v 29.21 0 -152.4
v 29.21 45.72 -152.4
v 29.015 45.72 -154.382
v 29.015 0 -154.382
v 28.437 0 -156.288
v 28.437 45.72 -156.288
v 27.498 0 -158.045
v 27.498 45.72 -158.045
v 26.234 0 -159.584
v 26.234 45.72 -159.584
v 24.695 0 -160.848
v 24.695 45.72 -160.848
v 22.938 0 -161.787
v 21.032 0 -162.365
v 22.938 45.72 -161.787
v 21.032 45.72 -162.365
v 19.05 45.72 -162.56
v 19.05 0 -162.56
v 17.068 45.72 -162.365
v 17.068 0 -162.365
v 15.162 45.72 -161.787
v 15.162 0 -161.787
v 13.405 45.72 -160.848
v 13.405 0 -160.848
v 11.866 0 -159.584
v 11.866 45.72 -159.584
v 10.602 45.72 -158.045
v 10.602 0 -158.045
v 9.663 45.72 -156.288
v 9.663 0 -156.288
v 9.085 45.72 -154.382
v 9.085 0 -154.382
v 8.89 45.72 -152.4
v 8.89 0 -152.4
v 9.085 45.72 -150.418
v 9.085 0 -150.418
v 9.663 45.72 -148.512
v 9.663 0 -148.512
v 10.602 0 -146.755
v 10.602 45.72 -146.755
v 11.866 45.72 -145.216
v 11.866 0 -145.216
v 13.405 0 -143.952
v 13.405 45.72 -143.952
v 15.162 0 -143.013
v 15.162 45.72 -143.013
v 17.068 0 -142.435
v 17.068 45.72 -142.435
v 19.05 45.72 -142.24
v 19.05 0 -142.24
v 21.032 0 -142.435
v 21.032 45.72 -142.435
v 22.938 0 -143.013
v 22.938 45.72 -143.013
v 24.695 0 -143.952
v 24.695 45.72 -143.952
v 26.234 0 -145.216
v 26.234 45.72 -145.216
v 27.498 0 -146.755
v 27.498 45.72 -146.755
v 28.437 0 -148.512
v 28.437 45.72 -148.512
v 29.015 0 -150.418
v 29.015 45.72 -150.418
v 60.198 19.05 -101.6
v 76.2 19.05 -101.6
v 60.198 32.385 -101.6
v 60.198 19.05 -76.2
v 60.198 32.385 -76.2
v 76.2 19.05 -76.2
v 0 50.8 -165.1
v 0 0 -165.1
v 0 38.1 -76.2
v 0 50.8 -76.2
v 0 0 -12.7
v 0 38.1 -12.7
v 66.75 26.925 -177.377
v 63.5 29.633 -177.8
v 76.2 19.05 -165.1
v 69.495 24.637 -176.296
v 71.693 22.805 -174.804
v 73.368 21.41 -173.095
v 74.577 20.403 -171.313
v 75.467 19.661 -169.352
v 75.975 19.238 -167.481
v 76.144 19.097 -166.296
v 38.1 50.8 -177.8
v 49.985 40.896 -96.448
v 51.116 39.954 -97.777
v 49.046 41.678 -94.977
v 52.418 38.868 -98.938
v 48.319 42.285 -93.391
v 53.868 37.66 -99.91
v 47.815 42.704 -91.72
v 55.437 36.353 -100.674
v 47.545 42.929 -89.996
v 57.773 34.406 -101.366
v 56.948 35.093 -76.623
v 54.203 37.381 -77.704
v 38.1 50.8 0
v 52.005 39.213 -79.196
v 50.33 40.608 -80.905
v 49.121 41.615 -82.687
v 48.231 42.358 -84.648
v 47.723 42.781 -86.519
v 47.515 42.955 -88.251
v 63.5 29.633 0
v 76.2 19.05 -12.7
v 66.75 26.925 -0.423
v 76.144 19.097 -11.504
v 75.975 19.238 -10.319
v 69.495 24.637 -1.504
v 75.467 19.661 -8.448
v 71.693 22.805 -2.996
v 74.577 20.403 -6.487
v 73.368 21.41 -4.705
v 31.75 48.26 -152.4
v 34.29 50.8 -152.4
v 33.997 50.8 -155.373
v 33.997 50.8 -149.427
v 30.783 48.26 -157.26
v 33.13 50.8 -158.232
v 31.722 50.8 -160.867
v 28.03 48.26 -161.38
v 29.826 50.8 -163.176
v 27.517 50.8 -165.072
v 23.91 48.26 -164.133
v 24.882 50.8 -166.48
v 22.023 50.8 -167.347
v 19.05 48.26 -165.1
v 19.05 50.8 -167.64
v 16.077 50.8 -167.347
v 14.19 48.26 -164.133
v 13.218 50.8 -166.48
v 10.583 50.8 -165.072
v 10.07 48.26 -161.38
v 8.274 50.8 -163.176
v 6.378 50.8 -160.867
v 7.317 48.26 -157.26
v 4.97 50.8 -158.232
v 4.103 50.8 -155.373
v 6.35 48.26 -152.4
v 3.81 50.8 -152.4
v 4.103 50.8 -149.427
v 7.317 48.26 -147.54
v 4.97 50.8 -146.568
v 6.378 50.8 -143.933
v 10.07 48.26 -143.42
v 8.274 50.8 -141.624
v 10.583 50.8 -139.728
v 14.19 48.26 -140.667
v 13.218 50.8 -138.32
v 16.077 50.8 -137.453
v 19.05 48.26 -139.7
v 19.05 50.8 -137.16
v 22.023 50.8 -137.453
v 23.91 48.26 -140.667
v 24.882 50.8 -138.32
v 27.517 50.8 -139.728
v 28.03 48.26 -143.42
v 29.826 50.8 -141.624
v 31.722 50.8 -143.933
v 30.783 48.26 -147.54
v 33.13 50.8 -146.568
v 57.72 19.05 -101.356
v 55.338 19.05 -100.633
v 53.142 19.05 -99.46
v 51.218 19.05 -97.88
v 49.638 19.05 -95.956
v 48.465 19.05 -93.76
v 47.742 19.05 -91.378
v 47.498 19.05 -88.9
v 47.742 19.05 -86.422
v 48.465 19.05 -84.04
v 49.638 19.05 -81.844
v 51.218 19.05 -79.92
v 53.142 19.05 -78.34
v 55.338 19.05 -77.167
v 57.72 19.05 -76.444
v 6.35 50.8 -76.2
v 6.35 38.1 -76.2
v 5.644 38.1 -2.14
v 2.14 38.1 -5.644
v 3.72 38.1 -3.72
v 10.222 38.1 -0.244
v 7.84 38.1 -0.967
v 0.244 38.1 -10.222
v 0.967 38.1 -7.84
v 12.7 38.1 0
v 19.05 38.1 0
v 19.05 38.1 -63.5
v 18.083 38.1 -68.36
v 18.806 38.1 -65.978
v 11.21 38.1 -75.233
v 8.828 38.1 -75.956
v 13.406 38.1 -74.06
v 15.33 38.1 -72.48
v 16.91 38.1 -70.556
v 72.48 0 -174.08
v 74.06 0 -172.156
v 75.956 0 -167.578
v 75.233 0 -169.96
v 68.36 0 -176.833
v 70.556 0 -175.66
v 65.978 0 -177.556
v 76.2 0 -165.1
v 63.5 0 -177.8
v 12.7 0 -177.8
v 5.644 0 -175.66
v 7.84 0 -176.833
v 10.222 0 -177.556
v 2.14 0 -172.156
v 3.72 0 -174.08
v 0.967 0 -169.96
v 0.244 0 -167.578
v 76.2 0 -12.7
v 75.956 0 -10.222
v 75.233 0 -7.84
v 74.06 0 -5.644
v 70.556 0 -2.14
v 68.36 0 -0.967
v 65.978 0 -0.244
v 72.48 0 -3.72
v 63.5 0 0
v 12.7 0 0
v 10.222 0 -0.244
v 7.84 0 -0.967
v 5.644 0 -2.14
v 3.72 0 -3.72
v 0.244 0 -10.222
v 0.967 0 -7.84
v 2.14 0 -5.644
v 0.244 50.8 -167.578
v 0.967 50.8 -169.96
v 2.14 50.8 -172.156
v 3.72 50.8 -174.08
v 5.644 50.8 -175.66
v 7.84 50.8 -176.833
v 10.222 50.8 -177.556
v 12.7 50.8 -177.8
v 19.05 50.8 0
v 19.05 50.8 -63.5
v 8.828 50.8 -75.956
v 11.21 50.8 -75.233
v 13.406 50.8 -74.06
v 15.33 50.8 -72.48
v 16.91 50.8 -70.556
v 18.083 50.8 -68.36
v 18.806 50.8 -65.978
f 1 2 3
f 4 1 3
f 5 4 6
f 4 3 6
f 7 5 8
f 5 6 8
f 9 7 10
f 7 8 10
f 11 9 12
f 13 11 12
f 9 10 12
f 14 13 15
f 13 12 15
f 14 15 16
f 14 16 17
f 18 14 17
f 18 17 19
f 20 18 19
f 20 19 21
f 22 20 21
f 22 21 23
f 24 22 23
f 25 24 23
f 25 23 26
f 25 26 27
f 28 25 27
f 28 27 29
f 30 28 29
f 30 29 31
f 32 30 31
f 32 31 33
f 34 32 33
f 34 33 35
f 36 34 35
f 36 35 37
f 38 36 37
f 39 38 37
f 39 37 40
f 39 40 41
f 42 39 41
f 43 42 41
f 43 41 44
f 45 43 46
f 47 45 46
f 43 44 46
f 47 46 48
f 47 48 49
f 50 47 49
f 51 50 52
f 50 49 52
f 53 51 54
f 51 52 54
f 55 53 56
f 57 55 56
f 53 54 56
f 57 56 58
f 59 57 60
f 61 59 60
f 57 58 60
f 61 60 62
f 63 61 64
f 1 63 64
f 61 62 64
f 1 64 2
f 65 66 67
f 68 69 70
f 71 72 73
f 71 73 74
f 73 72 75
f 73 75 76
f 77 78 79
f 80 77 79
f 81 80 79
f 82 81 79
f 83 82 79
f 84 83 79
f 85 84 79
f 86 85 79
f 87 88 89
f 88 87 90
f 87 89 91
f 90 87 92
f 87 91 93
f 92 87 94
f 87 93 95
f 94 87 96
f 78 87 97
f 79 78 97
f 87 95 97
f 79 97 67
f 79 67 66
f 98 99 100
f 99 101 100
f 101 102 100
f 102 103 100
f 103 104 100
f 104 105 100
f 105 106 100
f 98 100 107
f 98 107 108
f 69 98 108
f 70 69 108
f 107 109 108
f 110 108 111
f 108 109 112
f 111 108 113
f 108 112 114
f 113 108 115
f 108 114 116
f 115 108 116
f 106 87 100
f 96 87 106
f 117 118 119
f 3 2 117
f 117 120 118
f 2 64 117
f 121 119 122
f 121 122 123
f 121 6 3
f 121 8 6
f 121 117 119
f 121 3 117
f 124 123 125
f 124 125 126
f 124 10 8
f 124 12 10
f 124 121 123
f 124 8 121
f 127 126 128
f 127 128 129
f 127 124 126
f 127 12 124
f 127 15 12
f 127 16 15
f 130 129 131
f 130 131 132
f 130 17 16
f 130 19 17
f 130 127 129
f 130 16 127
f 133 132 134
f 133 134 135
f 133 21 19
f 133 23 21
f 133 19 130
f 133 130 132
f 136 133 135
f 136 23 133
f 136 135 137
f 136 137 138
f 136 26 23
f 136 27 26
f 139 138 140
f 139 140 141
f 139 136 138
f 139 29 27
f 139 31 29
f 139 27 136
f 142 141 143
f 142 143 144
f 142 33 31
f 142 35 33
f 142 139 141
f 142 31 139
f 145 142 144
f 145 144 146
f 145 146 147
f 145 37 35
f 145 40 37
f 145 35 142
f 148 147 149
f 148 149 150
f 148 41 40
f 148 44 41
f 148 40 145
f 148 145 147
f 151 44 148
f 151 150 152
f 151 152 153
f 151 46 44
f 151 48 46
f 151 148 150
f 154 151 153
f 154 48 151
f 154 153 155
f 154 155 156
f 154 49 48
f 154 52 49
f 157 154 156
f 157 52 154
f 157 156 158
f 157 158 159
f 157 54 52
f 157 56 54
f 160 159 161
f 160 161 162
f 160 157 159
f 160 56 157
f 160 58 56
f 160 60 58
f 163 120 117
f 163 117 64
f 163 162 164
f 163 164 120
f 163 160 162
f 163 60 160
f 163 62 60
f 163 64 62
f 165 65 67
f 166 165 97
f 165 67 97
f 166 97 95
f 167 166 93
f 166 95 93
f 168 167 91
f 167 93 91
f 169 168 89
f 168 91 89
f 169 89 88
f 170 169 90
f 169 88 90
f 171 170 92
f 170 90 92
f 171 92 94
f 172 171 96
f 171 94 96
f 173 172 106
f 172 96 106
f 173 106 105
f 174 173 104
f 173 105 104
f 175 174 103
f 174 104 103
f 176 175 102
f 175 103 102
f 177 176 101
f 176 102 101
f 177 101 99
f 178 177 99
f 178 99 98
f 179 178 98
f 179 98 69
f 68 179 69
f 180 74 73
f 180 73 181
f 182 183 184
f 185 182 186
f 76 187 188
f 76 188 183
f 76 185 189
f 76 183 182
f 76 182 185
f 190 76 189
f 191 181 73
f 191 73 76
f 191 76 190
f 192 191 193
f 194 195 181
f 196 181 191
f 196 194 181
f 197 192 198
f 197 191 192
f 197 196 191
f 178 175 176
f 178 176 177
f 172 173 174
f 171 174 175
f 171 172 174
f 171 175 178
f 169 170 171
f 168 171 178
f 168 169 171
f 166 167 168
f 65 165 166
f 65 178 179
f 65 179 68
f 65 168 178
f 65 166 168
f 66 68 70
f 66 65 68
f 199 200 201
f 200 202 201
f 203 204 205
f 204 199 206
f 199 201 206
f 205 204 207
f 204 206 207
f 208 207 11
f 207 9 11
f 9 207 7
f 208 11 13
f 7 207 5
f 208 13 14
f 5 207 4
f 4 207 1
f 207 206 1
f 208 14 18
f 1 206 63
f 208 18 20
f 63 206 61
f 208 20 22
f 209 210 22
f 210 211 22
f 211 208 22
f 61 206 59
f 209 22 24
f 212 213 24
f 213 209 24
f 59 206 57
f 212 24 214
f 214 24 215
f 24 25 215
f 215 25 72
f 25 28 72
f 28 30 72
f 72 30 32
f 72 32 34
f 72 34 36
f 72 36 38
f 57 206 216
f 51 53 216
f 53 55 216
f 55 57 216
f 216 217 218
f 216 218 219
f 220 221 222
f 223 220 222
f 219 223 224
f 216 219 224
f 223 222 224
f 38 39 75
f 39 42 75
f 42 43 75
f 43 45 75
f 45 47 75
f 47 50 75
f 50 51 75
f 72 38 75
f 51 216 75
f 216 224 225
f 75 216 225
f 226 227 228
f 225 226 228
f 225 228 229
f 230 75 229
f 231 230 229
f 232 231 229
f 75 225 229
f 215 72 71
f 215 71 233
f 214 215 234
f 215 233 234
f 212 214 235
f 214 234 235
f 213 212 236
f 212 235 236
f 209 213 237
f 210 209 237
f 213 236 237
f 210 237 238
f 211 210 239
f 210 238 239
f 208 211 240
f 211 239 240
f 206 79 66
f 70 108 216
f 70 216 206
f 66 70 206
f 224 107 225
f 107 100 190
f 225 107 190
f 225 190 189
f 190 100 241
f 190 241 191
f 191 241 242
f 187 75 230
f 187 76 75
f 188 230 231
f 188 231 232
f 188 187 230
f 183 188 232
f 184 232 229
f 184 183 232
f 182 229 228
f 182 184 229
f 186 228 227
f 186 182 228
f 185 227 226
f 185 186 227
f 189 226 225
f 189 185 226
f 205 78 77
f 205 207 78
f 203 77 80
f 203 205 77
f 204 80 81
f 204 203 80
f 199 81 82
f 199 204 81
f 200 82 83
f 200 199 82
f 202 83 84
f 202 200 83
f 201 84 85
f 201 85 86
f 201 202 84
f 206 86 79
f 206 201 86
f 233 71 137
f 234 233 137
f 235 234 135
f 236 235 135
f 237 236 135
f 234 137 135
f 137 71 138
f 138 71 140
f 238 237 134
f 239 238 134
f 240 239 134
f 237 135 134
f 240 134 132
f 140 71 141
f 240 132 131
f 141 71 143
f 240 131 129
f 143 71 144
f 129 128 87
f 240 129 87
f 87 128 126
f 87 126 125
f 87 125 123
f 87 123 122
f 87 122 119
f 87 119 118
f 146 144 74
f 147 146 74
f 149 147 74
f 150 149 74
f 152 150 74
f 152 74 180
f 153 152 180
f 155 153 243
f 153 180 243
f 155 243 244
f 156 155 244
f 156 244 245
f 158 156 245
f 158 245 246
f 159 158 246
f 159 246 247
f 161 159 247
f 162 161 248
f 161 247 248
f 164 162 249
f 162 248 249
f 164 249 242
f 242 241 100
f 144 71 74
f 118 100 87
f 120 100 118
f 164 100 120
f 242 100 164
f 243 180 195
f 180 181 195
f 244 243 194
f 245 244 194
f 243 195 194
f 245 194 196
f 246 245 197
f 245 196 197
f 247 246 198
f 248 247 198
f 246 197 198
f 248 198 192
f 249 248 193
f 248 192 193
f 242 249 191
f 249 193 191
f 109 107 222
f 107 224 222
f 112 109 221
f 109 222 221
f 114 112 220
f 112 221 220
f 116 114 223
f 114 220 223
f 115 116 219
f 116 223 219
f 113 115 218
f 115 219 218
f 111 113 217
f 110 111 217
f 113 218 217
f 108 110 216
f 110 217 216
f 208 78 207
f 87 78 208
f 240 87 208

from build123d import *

# Parameters (mm, degrees)
BOSS_EXTRUDE1_DEPTH = 177.8
SKETCH8_R           = 10.16
CUT_EXTRUDE1_DEPTH  = 51.8
CHAMFER1_SIZE       = 5.08
SKETCH9_W           = 19.05
SKETCH9_H           = 76.2
CUT_EXTRUDE2_DEPTH  = 12.7
FILLET1_R           = 12.7
CUT_EXTRUDE3_DEPTH  = 31.75
FILLET2_R           = 12.7


with BuildPart() as part:
    # Sketch1 → Boss-Extrude1 (new body)
    with BuildSketch(Plane.XY):
        Polygon((0, 0), (0, 50.8), (38.1, 50.8), (76.2, 19.05), (76.2, 0), align=None)
    extrude(amount=-BOSS_EXTRUDE1_DEPTH)

    # Sketch8 → Cut-Extrude1 (cut, through all)
    with BuildSketch(Plane(origin=(0, 50.8, 0), x_dir=(1, 0, 0), z_dir=(0, 1, 0))):
        with Locations((19.05, 152.4)):
            Circle(SKETCH8_R)
    extrude(amount=-CUT_EXTRUDE1_DEPTH, mode=Mode.SUBTRACT)

    # Chamfer1
    chamfer1_edges = [part.edges().sort_by_distance(p)[0] for p in [
        (8.89, 50.8, -152.4),
    ]]
    chamfer(chamfer1_edges, length=CHAMFER1_SIZE)

    # Sketch9 → Cut-Extrude2 (cut)
    with BuildSketch(Plane(origin=(0, 50.8, 0), x_dir=(1, 0, 0), z_dir=(0, 1, 0))):
        with Locations((9.525, 38.1)):
            Rectangle(SKETCH9_W, SKETCH9_H)
    extrude(amount=-CUT_EXTRUDE2_DEPTH, mode=Mode.SUBTRACT)

    # Fillet1
    fillet1_edges = [part.edges().sort_by_distance(p)[0] for p in [
        (19.05, 44.45, -76.2),
    ]]
    fillet(fillet1_edges, radius=FILLET1_R)

    # Sketch10 → Cut-Extrude3 (cut)
    with BuildSketch(Plane(origin=(0, 50.8, 0), x_dir=(1, 0, 0), z_dir=(0, 1, 0))):
        with BuildLine():
            Line((76.2, 101.6), (60.198, 101.6))
            ThreePointArc((60.198, 101.6), (47.498, 88.9), (60.198, 76.2))
            Line((60.198, 76.2), (76.2, 76.2))
            Line((76.2, 76.2), (76.2, 101.6))
        make_face()
    extrude(amount=-CUT_EXTRUDE3_DEPTH, mode=Mode.SUBTRACT)

    # Fillet2
    fillet2_edges = [part.edges().sort_by_distance(p)[0] for p in [
        (0, 25.4, -177.8),
        (0, 19.05, 0),
        (76.2, 9.525, 0),
        (76.2, 9.525, -177.8),
    ]]
    fillet(fillet2_edges, radius=FILLET2_R)


solid = part.part
